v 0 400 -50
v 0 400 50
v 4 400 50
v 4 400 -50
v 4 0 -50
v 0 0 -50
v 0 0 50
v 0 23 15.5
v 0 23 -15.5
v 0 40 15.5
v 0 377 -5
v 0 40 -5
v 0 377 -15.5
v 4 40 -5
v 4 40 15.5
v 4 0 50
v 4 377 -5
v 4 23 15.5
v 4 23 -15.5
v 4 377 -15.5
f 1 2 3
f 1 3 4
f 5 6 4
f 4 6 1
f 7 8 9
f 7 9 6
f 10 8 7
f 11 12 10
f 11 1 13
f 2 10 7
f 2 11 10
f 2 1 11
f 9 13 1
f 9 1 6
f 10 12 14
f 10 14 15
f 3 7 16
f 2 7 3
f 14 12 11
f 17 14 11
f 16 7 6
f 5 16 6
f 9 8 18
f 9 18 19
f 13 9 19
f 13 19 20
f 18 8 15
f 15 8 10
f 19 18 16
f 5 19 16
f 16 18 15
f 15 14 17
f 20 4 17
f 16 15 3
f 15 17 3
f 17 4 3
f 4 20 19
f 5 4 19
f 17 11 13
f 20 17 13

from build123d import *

# Parameters (mm, degrees)
SKETCH1_W           = 100
SKETCH1_H           = 400
SKETCH1_W_2         = 31
SKETCH1_H_2         = 354
BOSS_EXTRUDE1_DEPTH = 4
SKETCH2_W           = 20.5
SKETCH2_H           = 337
BOSS_EXTRUDE2_DEPTH = 4


with BuildPart() as part:
    # Sketch1 → Boss-Extrude1 (new body)
    with BuildSketch(Plane(origin=(0, 0, 0), x_dir=(0, 0, -1), z_dir=(1, 0, 0))):
        with Locations((0, 200)):
            Rectangle(SKETCH1_W, SKETCH1_H)
        with Locations((0, 200)):
            Rectangle(SKETCH1_W_2, SKETCH1_H_2, mode=Mode.SUBTRACT)
    extrude(amount=BOSS_EXTRUDE1_DEPTH)

    # Sketch2 → Boss-Extrude2 (add)
    with BuildSketch(Plane.ZY):
        with Locations((5.25, 208.5)):
            Rectangle(SKETCH2_W, SKETCH2_H)
    extrude(amount=-BOSS_EXTRUDE2_DEPTH)


solid = part.part
